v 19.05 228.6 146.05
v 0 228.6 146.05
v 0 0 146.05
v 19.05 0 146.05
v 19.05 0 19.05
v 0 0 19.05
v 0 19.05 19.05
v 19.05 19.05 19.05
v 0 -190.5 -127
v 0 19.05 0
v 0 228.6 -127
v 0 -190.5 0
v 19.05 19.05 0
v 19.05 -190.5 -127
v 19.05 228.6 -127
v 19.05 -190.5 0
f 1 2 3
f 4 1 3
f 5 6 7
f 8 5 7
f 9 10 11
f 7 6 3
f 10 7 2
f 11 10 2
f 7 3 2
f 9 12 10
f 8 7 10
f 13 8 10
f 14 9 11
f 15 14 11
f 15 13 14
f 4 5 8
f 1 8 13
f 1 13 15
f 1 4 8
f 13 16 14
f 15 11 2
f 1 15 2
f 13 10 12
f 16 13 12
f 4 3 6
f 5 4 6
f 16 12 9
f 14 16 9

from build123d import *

# Parameters (mm, degrees)
F1_DEPTH = 19.05


with BuildPart() as f1:
    # F0 (on Right) → F1 (new body)
    with BuildSketch(Plane.YZ):
        Polygon((19.05, 19.05), (19.05, 0), (228.6, 0), (228.6, 146.05), (0, 146.05), (0, 19.05), align=None)
        Polygon((19.05, 0), (0, 0), (-190.5, 0), (-190.5, -127), (228.6, -127), (228.6, 0), align=None)
    extrude(amount=F1_DEPTH)


solid = f1.part
